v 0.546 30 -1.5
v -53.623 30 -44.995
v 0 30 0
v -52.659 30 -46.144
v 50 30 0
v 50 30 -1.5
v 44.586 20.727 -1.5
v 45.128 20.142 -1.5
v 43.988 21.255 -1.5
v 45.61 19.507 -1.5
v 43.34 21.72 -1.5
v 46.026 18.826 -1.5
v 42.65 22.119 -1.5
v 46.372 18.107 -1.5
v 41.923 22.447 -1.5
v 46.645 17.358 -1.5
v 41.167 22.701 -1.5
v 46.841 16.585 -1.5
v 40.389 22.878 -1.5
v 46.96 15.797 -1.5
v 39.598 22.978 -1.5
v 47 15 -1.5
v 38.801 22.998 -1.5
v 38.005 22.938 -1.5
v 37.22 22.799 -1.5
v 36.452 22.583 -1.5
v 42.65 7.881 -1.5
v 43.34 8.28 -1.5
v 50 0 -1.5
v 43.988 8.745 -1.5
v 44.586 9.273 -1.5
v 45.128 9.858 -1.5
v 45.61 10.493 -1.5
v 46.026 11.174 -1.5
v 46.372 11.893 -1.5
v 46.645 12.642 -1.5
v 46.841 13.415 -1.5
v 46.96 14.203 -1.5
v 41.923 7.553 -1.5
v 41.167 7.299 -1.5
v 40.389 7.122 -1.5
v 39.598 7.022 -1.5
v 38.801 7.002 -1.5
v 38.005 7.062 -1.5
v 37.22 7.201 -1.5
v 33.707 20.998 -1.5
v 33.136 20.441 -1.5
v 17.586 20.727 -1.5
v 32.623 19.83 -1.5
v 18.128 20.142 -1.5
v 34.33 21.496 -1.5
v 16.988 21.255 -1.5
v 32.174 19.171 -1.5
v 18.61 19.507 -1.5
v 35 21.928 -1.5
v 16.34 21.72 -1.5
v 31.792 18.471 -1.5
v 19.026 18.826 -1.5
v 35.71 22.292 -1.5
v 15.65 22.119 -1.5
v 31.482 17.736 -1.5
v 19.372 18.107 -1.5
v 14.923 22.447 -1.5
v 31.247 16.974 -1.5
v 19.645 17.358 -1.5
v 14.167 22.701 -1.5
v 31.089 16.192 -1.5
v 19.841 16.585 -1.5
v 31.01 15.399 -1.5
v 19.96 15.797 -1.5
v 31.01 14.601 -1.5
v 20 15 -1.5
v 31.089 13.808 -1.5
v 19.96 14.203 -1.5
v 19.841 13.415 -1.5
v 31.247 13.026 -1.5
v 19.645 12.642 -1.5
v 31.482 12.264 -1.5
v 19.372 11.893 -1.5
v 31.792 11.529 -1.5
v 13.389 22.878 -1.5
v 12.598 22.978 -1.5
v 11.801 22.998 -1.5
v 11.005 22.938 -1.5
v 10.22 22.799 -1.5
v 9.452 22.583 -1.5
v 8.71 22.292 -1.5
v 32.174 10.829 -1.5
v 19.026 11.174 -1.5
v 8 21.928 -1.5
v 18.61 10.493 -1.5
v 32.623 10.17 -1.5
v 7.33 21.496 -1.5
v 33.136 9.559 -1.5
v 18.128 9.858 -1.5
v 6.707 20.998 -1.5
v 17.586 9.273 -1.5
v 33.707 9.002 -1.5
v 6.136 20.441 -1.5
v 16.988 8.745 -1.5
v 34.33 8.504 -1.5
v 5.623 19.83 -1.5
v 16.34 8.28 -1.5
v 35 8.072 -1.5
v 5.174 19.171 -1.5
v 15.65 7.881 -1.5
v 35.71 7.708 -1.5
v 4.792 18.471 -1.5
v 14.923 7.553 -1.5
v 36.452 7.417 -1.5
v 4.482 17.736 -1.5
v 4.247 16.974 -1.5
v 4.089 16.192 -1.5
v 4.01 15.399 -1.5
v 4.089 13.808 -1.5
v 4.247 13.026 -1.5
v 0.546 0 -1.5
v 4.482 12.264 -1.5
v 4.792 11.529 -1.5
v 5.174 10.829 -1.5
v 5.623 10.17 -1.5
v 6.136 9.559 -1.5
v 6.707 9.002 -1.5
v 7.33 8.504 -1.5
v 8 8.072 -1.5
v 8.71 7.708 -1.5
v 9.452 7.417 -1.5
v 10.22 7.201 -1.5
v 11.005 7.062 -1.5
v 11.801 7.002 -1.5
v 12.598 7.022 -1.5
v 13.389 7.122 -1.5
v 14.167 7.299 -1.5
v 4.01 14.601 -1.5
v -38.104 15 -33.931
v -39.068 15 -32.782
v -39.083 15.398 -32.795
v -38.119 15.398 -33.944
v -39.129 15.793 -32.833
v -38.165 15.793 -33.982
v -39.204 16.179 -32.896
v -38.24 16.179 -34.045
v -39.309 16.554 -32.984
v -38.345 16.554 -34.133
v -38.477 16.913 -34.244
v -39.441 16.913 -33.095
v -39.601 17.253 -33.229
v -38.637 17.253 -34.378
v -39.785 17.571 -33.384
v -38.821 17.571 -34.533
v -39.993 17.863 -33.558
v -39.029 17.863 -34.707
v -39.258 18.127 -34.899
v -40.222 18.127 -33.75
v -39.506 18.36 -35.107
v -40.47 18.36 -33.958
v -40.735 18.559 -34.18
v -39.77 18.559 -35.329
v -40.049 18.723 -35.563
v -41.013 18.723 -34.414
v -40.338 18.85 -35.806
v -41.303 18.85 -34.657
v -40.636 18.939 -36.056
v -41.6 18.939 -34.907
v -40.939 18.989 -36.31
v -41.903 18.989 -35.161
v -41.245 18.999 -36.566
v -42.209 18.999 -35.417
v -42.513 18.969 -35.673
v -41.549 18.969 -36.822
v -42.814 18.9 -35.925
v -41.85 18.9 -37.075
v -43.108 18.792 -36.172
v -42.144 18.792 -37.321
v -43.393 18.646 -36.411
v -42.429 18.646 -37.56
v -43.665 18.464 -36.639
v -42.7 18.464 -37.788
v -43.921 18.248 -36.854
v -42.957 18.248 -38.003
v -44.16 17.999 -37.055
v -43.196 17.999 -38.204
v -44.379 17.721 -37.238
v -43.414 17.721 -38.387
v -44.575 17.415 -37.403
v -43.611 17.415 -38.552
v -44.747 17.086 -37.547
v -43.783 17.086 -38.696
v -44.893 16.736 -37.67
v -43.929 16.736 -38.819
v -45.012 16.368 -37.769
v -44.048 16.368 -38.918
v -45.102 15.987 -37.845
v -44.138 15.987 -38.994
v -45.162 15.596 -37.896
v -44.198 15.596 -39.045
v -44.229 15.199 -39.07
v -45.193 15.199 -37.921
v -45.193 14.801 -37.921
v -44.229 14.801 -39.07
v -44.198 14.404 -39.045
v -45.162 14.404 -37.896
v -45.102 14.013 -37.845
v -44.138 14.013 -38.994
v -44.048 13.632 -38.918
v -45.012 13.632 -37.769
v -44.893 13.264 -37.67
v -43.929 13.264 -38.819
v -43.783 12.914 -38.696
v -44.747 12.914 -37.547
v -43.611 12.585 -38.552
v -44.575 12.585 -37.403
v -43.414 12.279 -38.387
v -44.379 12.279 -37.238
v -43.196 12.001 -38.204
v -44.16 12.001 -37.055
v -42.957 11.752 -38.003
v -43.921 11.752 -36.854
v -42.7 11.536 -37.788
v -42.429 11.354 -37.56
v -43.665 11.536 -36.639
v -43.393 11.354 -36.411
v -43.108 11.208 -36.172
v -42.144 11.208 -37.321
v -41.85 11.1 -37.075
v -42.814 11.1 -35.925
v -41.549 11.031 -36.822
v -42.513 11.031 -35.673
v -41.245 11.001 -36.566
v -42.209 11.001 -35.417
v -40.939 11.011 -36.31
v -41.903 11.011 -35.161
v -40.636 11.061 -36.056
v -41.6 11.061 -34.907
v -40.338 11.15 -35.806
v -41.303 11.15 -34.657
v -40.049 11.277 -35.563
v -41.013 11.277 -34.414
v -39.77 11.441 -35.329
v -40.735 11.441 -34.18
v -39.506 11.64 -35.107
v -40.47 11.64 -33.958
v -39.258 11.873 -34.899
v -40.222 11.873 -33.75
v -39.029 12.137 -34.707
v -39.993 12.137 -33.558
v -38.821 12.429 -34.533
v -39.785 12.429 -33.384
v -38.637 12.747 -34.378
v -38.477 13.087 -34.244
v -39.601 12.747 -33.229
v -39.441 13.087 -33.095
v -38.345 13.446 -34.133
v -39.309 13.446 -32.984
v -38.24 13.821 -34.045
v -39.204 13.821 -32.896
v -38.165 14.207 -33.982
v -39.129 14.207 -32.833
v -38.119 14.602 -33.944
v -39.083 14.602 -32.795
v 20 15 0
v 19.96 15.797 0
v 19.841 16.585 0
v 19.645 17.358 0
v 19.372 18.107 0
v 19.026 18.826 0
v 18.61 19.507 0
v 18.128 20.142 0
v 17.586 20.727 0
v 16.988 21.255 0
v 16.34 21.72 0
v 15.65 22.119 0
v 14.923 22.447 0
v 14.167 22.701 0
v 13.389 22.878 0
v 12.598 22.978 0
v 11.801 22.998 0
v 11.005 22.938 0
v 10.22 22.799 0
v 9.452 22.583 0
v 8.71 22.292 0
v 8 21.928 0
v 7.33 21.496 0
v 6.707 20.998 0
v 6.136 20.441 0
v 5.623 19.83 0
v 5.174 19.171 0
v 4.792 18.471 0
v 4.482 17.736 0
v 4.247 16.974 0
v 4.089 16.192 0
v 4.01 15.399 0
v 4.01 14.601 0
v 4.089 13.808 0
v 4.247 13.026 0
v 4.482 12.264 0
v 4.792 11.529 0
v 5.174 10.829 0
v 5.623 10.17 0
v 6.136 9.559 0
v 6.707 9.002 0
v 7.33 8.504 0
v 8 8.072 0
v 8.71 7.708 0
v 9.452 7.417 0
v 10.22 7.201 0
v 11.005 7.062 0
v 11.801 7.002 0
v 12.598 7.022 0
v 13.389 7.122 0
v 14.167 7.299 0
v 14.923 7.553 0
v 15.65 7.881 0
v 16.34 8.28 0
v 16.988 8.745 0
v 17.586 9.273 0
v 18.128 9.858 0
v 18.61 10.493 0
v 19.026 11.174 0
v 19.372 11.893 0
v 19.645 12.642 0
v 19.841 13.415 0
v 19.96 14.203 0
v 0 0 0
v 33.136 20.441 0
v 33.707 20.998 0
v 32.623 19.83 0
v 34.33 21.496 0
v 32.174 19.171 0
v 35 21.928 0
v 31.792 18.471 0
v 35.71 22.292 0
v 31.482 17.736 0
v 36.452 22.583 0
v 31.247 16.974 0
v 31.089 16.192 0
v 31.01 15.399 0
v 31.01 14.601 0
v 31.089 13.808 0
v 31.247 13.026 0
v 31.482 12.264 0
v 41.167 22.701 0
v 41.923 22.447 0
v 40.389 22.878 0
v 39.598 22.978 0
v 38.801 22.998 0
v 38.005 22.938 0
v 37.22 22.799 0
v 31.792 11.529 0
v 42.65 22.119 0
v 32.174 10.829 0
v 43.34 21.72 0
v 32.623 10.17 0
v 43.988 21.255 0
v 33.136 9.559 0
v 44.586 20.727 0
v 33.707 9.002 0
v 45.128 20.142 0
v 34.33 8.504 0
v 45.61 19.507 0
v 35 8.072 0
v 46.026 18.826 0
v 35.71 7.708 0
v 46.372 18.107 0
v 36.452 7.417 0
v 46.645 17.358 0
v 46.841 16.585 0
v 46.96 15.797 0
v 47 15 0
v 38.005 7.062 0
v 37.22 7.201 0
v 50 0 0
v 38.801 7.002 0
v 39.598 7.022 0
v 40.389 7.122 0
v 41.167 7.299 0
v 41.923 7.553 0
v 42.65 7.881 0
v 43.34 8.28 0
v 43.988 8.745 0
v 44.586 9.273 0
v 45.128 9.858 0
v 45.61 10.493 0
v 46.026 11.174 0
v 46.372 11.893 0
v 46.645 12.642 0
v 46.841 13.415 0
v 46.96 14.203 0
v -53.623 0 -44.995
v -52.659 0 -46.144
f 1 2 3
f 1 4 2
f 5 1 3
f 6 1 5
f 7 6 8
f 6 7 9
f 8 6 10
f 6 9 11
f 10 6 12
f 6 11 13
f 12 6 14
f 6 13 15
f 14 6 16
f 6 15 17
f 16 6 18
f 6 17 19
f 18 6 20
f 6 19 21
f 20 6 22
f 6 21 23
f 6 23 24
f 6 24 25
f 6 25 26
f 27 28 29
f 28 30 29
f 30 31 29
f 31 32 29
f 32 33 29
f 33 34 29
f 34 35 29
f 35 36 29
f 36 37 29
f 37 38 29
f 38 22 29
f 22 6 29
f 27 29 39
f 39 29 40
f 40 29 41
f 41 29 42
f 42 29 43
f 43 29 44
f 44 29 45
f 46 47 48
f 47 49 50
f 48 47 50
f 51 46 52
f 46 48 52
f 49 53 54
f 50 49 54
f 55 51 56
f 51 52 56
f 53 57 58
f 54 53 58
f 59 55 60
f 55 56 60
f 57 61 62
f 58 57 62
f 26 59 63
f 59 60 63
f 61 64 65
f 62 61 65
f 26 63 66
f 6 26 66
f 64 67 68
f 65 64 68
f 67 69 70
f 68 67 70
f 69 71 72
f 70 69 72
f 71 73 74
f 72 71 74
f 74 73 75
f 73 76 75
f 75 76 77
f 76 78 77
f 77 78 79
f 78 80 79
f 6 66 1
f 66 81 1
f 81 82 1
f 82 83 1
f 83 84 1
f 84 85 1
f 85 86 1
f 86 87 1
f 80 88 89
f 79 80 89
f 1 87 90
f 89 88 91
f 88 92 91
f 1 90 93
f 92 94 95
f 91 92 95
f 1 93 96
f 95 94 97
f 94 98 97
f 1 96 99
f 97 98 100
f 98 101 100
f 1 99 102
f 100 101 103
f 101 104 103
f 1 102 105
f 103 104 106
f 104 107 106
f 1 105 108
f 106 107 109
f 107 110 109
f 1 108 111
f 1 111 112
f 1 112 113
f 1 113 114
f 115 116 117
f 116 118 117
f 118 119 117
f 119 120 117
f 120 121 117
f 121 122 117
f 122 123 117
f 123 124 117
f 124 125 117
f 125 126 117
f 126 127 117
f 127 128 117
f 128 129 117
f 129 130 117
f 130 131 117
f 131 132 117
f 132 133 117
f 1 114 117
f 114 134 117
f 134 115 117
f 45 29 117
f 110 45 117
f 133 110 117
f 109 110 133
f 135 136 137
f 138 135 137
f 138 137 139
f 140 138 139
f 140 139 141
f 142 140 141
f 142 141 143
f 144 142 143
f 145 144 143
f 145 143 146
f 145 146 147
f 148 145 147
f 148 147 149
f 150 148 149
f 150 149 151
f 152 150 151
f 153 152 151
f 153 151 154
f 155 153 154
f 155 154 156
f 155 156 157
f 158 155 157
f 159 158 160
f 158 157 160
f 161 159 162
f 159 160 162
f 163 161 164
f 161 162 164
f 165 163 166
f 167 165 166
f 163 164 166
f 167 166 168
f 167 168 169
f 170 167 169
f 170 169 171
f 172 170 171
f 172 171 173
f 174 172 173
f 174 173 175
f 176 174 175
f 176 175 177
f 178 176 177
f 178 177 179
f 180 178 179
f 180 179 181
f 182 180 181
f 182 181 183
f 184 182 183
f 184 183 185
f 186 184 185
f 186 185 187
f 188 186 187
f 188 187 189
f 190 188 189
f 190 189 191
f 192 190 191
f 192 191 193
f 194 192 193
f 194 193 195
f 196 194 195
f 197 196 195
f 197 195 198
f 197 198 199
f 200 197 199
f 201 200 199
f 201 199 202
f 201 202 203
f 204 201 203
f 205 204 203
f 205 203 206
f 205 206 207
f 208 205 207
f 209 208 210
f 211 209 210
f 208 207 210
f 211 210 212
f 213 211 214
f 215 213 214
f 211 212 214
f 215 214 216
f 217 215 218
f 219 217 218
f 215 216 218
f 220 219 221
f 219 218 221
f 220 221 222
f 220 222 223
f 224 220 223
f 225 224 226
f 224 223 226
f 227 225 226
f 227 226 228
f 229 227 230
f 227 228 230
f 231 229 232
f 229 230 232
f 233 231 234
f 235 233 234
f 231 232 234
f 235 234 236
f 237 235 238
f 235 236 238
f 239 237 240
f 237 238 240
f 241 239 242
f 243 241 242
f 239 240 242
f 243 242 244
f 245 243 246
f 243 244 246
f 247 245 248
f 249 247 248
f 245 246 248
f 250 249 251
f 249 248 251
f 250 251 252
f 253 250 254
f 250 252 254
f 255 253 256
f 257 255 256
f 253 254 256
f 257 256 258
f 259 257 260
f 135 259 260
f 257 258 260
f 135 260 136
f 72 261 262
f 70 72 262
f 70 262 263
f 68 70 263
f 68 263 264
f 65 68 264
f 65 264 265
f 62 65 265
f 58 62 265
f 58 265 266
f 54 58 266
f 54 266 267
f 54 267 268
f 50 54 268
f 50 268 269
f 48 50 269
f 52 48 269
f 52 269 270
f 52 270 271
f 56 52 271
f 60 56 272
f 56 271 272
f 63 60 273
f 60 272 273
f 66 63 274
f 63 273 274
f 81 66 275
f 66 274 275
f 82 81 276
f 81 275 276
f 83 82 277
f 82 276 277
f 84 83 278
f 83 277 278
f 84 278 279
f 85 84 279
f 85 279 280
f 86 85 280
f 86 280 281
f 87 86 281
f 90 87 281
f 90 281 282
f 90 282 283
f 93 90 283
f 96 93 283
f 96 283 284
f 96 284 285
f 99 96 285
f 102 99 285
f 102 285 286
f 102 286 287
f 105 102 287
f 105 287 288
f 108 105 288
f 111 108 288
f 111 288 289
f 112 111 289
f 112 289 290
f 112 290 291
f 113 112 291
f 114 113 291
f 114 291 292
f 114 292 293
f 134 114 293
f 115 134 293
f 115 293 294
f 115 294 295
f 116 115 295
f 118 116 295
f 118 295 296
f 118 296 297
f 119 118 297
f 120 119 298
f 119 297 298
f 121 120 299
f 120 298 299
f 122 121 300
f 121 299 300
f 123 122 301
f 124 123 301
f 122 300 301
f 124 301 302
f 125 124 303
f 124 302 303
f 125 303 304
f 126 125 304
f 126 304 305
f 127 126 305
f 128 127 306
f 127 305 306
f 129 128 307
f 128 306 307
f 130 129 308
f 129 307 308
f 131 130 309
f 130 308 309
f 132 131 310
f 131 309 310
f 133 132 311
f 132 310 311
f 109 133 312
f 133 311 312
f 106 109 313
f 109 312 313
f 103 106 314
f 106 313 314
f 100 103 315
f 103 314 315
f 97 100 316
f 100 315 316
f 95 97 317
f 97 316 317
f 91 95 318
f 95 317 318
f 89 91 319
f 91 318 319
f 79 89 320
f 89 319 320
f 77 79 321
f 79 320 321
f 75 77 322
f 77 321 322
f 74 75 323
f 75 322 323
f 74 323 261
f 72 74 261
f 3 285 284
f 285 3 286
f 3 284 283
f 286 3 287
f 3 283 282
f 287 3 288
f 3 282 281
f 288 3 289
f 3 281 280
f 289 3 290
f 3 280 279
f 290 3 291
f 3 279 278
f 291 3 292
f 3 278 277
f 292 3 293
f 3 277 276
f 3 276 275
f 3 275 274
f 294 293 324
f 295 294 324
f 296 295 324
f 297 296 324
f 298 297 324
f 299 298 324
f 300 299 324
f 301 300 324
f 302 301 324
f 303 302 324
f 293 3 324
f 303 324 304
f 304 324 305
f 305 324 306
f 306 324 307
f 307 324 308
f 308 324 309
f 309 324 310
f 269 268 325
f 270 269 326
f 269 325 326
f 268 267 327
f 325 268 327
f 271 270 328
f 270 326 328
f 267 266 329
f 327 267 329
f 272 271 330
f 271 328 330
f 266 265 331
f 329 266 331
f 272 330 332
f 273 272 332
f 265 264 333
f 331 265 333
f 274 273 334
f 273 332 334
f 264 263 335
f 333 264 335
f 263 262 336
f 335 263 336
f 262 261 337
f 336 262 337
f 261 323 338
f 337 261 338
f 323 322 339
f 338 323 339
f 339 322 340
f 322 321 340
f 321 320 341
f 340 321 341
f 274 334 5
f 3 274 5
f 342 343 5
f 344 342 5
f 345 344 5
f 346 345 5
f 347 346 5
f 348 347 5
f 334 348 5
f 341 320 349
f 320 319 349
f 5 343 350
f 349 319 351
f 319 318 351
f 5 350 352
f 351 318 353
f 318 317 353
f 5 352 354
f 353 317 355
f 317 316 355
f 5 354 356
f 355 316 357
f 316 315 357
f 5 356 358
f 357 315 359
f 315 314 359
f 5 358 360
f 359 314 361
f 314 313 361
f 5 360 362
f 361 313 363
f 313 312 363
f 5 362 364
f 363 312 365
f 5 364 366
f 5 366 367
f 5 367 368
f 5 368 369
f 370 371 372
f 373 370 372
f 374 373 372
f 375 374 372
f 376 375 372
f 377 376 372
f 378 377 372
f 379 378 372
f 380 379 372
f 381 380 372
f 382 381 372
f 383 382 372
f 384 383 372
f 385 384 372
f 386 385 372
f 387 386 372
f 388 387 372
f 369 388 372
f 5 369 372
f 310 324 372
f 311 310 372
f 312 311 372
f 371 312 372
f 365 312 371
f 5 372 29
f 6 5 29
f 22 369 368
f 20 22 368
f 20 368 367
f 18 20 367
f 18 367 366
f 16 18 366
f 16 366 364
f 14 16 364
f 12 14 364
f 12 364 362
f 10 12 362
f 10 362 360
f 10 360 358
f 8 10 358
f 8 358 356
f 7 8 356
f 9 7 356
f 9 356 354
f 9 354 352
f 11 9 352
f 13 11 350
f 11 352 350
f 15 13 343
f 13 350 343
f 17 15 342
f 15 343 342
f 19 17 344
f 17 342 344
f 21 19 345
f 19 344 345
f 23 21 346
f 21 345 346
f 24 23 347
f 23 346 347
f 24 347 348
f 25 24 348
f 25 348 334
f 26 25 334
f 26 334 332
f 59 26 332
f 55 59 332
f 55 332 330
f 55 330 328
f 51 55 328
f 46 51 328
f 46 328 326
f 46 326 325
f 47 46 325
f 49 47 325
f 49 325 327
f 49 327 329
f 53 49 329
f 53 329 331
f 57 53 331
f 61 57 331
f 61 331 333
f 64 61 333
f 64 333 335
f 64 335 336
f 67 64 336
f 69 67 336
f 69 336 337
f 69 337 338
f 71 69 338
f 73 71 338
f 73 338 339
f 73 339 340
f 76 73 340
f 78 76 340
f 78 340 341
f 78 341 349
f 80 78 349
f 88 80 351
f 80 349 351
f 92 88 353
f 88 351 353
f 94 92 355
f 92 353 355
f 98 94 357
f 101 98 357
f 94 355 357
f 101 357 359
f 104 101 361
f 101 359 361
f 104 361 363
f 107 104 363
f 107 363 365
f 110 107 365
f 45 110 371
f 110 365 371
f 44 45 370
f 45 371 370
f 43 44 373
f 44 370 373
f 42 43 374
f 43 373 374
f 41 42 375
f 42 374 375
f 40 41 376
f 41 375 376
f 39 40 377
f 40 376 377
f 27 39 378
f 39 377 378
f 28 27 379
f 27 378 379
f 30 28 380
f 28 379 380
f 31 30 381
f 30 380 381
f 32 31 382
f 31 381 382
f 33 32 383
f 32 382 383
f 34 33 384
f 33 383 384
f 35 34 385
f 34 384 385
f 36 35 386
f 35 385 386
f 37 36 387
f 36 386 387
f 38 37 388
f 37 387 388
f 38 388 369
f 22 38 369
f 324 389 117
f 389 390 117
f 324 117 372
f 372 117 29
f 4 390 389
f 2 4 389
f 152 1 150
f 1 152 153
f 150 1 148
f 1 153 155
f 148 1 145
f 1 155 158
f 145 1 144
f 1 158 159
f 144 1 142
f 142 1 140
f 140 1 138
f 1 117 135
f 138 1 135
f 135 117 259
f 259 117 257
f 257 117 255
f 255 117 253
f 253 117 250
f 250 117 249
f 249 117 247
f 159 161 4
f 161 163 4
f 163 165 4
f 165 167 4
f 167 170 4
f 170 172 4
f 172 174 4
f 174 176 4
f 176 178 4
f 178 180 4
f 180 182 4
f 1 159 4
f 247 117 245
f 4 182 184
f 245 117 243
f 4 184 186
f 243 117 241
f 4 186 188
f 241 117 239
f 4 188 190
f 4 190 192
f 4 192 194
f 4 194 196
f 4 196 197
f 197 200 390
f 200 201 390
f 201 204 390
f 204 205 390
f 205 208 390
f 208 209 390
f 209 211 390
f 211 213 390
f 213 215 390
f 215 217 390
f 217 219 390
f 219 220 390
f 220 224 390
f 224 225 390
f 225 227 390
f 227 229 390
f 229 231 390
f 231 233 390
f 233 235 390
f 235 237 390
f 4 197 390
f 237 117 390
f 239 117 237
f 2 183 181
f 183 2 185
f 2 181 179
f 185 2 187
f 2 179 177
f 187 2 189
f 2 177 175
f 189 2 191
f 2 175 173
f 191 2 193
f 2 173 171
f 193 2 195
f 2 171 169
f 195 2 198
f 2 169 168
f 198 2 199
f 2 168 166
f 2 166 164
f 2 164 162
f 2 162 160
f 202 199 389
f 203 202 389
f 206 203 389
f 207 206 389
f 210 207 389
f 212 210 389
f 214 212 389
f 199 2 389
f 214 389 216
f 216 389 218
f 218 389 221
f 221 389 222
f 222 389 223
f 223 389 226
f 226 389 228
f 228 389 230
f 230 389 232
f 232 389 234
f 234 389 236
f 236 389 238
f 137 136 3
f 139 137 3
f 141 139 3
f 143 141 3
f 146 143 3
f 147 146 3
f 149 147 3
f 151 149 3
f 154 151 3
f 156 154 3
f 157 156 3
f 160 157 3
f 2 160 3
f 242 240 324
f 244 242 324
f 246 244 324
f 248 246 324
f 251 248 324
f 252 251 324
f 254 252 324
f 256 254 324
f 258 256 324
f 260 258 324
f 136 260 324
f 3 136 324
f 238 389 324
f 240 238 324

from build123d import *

# Parameters (mm, degrees)
EXTRUDE_THIN1_DEPTH = 30
SKETCH2_R           = 4
CUT_EXTRUDE1_DEPTH  = 10
SKETCH3_R           = 8
CUT_EXTRUDE2_DEPTH  = 10


with BuildPart() as part:
    # Sketch1 → Extrude-Thin1 (new body)
    with BuildSketch(Plane(origin=(0, 0, 0), x_dir=(1, 0, 0), z_dir=(0, 1, 0))):
        Polygon((-53.623111018, 44.995132678), (0, 0), (50, 0), (50, 1.5), (0.545955351, 1.5), (-52.658929604, 46.144199343), align=None)
    extrude(amount=EXTRUDE_THIN1_DEPTH)

    # Sketch2 → Cut-Extrude1 (cut)
    with BuildSketch(Plane(origin=(0, 0, 0), x_dir=(0.7660444431189818, 0, 0.6427876096865349), z_dir=(-0.6427876096865348, 0, 0.7660444431189817))):
        with Locations((-55, 15)):
            Circle(SKETCH2_R)
    extrude(amount=-CUT_EXTRUDE1_DEPTH, mode=Mode.SUBTRACT)

    # Sketch3 → Cut-Extrude2 (cut)
    with BuildSketch(Plane.XY):
        with Locations((12, 15)):
            Circle(SKETCH3_R)
        with Locations((39, 15)):
            Circle(SKETCH3_R)
    extrude(amount=-CUT_EXTRUDE2_DEPTH, mode=Mode.SUBTRACT)


solid = part.part
